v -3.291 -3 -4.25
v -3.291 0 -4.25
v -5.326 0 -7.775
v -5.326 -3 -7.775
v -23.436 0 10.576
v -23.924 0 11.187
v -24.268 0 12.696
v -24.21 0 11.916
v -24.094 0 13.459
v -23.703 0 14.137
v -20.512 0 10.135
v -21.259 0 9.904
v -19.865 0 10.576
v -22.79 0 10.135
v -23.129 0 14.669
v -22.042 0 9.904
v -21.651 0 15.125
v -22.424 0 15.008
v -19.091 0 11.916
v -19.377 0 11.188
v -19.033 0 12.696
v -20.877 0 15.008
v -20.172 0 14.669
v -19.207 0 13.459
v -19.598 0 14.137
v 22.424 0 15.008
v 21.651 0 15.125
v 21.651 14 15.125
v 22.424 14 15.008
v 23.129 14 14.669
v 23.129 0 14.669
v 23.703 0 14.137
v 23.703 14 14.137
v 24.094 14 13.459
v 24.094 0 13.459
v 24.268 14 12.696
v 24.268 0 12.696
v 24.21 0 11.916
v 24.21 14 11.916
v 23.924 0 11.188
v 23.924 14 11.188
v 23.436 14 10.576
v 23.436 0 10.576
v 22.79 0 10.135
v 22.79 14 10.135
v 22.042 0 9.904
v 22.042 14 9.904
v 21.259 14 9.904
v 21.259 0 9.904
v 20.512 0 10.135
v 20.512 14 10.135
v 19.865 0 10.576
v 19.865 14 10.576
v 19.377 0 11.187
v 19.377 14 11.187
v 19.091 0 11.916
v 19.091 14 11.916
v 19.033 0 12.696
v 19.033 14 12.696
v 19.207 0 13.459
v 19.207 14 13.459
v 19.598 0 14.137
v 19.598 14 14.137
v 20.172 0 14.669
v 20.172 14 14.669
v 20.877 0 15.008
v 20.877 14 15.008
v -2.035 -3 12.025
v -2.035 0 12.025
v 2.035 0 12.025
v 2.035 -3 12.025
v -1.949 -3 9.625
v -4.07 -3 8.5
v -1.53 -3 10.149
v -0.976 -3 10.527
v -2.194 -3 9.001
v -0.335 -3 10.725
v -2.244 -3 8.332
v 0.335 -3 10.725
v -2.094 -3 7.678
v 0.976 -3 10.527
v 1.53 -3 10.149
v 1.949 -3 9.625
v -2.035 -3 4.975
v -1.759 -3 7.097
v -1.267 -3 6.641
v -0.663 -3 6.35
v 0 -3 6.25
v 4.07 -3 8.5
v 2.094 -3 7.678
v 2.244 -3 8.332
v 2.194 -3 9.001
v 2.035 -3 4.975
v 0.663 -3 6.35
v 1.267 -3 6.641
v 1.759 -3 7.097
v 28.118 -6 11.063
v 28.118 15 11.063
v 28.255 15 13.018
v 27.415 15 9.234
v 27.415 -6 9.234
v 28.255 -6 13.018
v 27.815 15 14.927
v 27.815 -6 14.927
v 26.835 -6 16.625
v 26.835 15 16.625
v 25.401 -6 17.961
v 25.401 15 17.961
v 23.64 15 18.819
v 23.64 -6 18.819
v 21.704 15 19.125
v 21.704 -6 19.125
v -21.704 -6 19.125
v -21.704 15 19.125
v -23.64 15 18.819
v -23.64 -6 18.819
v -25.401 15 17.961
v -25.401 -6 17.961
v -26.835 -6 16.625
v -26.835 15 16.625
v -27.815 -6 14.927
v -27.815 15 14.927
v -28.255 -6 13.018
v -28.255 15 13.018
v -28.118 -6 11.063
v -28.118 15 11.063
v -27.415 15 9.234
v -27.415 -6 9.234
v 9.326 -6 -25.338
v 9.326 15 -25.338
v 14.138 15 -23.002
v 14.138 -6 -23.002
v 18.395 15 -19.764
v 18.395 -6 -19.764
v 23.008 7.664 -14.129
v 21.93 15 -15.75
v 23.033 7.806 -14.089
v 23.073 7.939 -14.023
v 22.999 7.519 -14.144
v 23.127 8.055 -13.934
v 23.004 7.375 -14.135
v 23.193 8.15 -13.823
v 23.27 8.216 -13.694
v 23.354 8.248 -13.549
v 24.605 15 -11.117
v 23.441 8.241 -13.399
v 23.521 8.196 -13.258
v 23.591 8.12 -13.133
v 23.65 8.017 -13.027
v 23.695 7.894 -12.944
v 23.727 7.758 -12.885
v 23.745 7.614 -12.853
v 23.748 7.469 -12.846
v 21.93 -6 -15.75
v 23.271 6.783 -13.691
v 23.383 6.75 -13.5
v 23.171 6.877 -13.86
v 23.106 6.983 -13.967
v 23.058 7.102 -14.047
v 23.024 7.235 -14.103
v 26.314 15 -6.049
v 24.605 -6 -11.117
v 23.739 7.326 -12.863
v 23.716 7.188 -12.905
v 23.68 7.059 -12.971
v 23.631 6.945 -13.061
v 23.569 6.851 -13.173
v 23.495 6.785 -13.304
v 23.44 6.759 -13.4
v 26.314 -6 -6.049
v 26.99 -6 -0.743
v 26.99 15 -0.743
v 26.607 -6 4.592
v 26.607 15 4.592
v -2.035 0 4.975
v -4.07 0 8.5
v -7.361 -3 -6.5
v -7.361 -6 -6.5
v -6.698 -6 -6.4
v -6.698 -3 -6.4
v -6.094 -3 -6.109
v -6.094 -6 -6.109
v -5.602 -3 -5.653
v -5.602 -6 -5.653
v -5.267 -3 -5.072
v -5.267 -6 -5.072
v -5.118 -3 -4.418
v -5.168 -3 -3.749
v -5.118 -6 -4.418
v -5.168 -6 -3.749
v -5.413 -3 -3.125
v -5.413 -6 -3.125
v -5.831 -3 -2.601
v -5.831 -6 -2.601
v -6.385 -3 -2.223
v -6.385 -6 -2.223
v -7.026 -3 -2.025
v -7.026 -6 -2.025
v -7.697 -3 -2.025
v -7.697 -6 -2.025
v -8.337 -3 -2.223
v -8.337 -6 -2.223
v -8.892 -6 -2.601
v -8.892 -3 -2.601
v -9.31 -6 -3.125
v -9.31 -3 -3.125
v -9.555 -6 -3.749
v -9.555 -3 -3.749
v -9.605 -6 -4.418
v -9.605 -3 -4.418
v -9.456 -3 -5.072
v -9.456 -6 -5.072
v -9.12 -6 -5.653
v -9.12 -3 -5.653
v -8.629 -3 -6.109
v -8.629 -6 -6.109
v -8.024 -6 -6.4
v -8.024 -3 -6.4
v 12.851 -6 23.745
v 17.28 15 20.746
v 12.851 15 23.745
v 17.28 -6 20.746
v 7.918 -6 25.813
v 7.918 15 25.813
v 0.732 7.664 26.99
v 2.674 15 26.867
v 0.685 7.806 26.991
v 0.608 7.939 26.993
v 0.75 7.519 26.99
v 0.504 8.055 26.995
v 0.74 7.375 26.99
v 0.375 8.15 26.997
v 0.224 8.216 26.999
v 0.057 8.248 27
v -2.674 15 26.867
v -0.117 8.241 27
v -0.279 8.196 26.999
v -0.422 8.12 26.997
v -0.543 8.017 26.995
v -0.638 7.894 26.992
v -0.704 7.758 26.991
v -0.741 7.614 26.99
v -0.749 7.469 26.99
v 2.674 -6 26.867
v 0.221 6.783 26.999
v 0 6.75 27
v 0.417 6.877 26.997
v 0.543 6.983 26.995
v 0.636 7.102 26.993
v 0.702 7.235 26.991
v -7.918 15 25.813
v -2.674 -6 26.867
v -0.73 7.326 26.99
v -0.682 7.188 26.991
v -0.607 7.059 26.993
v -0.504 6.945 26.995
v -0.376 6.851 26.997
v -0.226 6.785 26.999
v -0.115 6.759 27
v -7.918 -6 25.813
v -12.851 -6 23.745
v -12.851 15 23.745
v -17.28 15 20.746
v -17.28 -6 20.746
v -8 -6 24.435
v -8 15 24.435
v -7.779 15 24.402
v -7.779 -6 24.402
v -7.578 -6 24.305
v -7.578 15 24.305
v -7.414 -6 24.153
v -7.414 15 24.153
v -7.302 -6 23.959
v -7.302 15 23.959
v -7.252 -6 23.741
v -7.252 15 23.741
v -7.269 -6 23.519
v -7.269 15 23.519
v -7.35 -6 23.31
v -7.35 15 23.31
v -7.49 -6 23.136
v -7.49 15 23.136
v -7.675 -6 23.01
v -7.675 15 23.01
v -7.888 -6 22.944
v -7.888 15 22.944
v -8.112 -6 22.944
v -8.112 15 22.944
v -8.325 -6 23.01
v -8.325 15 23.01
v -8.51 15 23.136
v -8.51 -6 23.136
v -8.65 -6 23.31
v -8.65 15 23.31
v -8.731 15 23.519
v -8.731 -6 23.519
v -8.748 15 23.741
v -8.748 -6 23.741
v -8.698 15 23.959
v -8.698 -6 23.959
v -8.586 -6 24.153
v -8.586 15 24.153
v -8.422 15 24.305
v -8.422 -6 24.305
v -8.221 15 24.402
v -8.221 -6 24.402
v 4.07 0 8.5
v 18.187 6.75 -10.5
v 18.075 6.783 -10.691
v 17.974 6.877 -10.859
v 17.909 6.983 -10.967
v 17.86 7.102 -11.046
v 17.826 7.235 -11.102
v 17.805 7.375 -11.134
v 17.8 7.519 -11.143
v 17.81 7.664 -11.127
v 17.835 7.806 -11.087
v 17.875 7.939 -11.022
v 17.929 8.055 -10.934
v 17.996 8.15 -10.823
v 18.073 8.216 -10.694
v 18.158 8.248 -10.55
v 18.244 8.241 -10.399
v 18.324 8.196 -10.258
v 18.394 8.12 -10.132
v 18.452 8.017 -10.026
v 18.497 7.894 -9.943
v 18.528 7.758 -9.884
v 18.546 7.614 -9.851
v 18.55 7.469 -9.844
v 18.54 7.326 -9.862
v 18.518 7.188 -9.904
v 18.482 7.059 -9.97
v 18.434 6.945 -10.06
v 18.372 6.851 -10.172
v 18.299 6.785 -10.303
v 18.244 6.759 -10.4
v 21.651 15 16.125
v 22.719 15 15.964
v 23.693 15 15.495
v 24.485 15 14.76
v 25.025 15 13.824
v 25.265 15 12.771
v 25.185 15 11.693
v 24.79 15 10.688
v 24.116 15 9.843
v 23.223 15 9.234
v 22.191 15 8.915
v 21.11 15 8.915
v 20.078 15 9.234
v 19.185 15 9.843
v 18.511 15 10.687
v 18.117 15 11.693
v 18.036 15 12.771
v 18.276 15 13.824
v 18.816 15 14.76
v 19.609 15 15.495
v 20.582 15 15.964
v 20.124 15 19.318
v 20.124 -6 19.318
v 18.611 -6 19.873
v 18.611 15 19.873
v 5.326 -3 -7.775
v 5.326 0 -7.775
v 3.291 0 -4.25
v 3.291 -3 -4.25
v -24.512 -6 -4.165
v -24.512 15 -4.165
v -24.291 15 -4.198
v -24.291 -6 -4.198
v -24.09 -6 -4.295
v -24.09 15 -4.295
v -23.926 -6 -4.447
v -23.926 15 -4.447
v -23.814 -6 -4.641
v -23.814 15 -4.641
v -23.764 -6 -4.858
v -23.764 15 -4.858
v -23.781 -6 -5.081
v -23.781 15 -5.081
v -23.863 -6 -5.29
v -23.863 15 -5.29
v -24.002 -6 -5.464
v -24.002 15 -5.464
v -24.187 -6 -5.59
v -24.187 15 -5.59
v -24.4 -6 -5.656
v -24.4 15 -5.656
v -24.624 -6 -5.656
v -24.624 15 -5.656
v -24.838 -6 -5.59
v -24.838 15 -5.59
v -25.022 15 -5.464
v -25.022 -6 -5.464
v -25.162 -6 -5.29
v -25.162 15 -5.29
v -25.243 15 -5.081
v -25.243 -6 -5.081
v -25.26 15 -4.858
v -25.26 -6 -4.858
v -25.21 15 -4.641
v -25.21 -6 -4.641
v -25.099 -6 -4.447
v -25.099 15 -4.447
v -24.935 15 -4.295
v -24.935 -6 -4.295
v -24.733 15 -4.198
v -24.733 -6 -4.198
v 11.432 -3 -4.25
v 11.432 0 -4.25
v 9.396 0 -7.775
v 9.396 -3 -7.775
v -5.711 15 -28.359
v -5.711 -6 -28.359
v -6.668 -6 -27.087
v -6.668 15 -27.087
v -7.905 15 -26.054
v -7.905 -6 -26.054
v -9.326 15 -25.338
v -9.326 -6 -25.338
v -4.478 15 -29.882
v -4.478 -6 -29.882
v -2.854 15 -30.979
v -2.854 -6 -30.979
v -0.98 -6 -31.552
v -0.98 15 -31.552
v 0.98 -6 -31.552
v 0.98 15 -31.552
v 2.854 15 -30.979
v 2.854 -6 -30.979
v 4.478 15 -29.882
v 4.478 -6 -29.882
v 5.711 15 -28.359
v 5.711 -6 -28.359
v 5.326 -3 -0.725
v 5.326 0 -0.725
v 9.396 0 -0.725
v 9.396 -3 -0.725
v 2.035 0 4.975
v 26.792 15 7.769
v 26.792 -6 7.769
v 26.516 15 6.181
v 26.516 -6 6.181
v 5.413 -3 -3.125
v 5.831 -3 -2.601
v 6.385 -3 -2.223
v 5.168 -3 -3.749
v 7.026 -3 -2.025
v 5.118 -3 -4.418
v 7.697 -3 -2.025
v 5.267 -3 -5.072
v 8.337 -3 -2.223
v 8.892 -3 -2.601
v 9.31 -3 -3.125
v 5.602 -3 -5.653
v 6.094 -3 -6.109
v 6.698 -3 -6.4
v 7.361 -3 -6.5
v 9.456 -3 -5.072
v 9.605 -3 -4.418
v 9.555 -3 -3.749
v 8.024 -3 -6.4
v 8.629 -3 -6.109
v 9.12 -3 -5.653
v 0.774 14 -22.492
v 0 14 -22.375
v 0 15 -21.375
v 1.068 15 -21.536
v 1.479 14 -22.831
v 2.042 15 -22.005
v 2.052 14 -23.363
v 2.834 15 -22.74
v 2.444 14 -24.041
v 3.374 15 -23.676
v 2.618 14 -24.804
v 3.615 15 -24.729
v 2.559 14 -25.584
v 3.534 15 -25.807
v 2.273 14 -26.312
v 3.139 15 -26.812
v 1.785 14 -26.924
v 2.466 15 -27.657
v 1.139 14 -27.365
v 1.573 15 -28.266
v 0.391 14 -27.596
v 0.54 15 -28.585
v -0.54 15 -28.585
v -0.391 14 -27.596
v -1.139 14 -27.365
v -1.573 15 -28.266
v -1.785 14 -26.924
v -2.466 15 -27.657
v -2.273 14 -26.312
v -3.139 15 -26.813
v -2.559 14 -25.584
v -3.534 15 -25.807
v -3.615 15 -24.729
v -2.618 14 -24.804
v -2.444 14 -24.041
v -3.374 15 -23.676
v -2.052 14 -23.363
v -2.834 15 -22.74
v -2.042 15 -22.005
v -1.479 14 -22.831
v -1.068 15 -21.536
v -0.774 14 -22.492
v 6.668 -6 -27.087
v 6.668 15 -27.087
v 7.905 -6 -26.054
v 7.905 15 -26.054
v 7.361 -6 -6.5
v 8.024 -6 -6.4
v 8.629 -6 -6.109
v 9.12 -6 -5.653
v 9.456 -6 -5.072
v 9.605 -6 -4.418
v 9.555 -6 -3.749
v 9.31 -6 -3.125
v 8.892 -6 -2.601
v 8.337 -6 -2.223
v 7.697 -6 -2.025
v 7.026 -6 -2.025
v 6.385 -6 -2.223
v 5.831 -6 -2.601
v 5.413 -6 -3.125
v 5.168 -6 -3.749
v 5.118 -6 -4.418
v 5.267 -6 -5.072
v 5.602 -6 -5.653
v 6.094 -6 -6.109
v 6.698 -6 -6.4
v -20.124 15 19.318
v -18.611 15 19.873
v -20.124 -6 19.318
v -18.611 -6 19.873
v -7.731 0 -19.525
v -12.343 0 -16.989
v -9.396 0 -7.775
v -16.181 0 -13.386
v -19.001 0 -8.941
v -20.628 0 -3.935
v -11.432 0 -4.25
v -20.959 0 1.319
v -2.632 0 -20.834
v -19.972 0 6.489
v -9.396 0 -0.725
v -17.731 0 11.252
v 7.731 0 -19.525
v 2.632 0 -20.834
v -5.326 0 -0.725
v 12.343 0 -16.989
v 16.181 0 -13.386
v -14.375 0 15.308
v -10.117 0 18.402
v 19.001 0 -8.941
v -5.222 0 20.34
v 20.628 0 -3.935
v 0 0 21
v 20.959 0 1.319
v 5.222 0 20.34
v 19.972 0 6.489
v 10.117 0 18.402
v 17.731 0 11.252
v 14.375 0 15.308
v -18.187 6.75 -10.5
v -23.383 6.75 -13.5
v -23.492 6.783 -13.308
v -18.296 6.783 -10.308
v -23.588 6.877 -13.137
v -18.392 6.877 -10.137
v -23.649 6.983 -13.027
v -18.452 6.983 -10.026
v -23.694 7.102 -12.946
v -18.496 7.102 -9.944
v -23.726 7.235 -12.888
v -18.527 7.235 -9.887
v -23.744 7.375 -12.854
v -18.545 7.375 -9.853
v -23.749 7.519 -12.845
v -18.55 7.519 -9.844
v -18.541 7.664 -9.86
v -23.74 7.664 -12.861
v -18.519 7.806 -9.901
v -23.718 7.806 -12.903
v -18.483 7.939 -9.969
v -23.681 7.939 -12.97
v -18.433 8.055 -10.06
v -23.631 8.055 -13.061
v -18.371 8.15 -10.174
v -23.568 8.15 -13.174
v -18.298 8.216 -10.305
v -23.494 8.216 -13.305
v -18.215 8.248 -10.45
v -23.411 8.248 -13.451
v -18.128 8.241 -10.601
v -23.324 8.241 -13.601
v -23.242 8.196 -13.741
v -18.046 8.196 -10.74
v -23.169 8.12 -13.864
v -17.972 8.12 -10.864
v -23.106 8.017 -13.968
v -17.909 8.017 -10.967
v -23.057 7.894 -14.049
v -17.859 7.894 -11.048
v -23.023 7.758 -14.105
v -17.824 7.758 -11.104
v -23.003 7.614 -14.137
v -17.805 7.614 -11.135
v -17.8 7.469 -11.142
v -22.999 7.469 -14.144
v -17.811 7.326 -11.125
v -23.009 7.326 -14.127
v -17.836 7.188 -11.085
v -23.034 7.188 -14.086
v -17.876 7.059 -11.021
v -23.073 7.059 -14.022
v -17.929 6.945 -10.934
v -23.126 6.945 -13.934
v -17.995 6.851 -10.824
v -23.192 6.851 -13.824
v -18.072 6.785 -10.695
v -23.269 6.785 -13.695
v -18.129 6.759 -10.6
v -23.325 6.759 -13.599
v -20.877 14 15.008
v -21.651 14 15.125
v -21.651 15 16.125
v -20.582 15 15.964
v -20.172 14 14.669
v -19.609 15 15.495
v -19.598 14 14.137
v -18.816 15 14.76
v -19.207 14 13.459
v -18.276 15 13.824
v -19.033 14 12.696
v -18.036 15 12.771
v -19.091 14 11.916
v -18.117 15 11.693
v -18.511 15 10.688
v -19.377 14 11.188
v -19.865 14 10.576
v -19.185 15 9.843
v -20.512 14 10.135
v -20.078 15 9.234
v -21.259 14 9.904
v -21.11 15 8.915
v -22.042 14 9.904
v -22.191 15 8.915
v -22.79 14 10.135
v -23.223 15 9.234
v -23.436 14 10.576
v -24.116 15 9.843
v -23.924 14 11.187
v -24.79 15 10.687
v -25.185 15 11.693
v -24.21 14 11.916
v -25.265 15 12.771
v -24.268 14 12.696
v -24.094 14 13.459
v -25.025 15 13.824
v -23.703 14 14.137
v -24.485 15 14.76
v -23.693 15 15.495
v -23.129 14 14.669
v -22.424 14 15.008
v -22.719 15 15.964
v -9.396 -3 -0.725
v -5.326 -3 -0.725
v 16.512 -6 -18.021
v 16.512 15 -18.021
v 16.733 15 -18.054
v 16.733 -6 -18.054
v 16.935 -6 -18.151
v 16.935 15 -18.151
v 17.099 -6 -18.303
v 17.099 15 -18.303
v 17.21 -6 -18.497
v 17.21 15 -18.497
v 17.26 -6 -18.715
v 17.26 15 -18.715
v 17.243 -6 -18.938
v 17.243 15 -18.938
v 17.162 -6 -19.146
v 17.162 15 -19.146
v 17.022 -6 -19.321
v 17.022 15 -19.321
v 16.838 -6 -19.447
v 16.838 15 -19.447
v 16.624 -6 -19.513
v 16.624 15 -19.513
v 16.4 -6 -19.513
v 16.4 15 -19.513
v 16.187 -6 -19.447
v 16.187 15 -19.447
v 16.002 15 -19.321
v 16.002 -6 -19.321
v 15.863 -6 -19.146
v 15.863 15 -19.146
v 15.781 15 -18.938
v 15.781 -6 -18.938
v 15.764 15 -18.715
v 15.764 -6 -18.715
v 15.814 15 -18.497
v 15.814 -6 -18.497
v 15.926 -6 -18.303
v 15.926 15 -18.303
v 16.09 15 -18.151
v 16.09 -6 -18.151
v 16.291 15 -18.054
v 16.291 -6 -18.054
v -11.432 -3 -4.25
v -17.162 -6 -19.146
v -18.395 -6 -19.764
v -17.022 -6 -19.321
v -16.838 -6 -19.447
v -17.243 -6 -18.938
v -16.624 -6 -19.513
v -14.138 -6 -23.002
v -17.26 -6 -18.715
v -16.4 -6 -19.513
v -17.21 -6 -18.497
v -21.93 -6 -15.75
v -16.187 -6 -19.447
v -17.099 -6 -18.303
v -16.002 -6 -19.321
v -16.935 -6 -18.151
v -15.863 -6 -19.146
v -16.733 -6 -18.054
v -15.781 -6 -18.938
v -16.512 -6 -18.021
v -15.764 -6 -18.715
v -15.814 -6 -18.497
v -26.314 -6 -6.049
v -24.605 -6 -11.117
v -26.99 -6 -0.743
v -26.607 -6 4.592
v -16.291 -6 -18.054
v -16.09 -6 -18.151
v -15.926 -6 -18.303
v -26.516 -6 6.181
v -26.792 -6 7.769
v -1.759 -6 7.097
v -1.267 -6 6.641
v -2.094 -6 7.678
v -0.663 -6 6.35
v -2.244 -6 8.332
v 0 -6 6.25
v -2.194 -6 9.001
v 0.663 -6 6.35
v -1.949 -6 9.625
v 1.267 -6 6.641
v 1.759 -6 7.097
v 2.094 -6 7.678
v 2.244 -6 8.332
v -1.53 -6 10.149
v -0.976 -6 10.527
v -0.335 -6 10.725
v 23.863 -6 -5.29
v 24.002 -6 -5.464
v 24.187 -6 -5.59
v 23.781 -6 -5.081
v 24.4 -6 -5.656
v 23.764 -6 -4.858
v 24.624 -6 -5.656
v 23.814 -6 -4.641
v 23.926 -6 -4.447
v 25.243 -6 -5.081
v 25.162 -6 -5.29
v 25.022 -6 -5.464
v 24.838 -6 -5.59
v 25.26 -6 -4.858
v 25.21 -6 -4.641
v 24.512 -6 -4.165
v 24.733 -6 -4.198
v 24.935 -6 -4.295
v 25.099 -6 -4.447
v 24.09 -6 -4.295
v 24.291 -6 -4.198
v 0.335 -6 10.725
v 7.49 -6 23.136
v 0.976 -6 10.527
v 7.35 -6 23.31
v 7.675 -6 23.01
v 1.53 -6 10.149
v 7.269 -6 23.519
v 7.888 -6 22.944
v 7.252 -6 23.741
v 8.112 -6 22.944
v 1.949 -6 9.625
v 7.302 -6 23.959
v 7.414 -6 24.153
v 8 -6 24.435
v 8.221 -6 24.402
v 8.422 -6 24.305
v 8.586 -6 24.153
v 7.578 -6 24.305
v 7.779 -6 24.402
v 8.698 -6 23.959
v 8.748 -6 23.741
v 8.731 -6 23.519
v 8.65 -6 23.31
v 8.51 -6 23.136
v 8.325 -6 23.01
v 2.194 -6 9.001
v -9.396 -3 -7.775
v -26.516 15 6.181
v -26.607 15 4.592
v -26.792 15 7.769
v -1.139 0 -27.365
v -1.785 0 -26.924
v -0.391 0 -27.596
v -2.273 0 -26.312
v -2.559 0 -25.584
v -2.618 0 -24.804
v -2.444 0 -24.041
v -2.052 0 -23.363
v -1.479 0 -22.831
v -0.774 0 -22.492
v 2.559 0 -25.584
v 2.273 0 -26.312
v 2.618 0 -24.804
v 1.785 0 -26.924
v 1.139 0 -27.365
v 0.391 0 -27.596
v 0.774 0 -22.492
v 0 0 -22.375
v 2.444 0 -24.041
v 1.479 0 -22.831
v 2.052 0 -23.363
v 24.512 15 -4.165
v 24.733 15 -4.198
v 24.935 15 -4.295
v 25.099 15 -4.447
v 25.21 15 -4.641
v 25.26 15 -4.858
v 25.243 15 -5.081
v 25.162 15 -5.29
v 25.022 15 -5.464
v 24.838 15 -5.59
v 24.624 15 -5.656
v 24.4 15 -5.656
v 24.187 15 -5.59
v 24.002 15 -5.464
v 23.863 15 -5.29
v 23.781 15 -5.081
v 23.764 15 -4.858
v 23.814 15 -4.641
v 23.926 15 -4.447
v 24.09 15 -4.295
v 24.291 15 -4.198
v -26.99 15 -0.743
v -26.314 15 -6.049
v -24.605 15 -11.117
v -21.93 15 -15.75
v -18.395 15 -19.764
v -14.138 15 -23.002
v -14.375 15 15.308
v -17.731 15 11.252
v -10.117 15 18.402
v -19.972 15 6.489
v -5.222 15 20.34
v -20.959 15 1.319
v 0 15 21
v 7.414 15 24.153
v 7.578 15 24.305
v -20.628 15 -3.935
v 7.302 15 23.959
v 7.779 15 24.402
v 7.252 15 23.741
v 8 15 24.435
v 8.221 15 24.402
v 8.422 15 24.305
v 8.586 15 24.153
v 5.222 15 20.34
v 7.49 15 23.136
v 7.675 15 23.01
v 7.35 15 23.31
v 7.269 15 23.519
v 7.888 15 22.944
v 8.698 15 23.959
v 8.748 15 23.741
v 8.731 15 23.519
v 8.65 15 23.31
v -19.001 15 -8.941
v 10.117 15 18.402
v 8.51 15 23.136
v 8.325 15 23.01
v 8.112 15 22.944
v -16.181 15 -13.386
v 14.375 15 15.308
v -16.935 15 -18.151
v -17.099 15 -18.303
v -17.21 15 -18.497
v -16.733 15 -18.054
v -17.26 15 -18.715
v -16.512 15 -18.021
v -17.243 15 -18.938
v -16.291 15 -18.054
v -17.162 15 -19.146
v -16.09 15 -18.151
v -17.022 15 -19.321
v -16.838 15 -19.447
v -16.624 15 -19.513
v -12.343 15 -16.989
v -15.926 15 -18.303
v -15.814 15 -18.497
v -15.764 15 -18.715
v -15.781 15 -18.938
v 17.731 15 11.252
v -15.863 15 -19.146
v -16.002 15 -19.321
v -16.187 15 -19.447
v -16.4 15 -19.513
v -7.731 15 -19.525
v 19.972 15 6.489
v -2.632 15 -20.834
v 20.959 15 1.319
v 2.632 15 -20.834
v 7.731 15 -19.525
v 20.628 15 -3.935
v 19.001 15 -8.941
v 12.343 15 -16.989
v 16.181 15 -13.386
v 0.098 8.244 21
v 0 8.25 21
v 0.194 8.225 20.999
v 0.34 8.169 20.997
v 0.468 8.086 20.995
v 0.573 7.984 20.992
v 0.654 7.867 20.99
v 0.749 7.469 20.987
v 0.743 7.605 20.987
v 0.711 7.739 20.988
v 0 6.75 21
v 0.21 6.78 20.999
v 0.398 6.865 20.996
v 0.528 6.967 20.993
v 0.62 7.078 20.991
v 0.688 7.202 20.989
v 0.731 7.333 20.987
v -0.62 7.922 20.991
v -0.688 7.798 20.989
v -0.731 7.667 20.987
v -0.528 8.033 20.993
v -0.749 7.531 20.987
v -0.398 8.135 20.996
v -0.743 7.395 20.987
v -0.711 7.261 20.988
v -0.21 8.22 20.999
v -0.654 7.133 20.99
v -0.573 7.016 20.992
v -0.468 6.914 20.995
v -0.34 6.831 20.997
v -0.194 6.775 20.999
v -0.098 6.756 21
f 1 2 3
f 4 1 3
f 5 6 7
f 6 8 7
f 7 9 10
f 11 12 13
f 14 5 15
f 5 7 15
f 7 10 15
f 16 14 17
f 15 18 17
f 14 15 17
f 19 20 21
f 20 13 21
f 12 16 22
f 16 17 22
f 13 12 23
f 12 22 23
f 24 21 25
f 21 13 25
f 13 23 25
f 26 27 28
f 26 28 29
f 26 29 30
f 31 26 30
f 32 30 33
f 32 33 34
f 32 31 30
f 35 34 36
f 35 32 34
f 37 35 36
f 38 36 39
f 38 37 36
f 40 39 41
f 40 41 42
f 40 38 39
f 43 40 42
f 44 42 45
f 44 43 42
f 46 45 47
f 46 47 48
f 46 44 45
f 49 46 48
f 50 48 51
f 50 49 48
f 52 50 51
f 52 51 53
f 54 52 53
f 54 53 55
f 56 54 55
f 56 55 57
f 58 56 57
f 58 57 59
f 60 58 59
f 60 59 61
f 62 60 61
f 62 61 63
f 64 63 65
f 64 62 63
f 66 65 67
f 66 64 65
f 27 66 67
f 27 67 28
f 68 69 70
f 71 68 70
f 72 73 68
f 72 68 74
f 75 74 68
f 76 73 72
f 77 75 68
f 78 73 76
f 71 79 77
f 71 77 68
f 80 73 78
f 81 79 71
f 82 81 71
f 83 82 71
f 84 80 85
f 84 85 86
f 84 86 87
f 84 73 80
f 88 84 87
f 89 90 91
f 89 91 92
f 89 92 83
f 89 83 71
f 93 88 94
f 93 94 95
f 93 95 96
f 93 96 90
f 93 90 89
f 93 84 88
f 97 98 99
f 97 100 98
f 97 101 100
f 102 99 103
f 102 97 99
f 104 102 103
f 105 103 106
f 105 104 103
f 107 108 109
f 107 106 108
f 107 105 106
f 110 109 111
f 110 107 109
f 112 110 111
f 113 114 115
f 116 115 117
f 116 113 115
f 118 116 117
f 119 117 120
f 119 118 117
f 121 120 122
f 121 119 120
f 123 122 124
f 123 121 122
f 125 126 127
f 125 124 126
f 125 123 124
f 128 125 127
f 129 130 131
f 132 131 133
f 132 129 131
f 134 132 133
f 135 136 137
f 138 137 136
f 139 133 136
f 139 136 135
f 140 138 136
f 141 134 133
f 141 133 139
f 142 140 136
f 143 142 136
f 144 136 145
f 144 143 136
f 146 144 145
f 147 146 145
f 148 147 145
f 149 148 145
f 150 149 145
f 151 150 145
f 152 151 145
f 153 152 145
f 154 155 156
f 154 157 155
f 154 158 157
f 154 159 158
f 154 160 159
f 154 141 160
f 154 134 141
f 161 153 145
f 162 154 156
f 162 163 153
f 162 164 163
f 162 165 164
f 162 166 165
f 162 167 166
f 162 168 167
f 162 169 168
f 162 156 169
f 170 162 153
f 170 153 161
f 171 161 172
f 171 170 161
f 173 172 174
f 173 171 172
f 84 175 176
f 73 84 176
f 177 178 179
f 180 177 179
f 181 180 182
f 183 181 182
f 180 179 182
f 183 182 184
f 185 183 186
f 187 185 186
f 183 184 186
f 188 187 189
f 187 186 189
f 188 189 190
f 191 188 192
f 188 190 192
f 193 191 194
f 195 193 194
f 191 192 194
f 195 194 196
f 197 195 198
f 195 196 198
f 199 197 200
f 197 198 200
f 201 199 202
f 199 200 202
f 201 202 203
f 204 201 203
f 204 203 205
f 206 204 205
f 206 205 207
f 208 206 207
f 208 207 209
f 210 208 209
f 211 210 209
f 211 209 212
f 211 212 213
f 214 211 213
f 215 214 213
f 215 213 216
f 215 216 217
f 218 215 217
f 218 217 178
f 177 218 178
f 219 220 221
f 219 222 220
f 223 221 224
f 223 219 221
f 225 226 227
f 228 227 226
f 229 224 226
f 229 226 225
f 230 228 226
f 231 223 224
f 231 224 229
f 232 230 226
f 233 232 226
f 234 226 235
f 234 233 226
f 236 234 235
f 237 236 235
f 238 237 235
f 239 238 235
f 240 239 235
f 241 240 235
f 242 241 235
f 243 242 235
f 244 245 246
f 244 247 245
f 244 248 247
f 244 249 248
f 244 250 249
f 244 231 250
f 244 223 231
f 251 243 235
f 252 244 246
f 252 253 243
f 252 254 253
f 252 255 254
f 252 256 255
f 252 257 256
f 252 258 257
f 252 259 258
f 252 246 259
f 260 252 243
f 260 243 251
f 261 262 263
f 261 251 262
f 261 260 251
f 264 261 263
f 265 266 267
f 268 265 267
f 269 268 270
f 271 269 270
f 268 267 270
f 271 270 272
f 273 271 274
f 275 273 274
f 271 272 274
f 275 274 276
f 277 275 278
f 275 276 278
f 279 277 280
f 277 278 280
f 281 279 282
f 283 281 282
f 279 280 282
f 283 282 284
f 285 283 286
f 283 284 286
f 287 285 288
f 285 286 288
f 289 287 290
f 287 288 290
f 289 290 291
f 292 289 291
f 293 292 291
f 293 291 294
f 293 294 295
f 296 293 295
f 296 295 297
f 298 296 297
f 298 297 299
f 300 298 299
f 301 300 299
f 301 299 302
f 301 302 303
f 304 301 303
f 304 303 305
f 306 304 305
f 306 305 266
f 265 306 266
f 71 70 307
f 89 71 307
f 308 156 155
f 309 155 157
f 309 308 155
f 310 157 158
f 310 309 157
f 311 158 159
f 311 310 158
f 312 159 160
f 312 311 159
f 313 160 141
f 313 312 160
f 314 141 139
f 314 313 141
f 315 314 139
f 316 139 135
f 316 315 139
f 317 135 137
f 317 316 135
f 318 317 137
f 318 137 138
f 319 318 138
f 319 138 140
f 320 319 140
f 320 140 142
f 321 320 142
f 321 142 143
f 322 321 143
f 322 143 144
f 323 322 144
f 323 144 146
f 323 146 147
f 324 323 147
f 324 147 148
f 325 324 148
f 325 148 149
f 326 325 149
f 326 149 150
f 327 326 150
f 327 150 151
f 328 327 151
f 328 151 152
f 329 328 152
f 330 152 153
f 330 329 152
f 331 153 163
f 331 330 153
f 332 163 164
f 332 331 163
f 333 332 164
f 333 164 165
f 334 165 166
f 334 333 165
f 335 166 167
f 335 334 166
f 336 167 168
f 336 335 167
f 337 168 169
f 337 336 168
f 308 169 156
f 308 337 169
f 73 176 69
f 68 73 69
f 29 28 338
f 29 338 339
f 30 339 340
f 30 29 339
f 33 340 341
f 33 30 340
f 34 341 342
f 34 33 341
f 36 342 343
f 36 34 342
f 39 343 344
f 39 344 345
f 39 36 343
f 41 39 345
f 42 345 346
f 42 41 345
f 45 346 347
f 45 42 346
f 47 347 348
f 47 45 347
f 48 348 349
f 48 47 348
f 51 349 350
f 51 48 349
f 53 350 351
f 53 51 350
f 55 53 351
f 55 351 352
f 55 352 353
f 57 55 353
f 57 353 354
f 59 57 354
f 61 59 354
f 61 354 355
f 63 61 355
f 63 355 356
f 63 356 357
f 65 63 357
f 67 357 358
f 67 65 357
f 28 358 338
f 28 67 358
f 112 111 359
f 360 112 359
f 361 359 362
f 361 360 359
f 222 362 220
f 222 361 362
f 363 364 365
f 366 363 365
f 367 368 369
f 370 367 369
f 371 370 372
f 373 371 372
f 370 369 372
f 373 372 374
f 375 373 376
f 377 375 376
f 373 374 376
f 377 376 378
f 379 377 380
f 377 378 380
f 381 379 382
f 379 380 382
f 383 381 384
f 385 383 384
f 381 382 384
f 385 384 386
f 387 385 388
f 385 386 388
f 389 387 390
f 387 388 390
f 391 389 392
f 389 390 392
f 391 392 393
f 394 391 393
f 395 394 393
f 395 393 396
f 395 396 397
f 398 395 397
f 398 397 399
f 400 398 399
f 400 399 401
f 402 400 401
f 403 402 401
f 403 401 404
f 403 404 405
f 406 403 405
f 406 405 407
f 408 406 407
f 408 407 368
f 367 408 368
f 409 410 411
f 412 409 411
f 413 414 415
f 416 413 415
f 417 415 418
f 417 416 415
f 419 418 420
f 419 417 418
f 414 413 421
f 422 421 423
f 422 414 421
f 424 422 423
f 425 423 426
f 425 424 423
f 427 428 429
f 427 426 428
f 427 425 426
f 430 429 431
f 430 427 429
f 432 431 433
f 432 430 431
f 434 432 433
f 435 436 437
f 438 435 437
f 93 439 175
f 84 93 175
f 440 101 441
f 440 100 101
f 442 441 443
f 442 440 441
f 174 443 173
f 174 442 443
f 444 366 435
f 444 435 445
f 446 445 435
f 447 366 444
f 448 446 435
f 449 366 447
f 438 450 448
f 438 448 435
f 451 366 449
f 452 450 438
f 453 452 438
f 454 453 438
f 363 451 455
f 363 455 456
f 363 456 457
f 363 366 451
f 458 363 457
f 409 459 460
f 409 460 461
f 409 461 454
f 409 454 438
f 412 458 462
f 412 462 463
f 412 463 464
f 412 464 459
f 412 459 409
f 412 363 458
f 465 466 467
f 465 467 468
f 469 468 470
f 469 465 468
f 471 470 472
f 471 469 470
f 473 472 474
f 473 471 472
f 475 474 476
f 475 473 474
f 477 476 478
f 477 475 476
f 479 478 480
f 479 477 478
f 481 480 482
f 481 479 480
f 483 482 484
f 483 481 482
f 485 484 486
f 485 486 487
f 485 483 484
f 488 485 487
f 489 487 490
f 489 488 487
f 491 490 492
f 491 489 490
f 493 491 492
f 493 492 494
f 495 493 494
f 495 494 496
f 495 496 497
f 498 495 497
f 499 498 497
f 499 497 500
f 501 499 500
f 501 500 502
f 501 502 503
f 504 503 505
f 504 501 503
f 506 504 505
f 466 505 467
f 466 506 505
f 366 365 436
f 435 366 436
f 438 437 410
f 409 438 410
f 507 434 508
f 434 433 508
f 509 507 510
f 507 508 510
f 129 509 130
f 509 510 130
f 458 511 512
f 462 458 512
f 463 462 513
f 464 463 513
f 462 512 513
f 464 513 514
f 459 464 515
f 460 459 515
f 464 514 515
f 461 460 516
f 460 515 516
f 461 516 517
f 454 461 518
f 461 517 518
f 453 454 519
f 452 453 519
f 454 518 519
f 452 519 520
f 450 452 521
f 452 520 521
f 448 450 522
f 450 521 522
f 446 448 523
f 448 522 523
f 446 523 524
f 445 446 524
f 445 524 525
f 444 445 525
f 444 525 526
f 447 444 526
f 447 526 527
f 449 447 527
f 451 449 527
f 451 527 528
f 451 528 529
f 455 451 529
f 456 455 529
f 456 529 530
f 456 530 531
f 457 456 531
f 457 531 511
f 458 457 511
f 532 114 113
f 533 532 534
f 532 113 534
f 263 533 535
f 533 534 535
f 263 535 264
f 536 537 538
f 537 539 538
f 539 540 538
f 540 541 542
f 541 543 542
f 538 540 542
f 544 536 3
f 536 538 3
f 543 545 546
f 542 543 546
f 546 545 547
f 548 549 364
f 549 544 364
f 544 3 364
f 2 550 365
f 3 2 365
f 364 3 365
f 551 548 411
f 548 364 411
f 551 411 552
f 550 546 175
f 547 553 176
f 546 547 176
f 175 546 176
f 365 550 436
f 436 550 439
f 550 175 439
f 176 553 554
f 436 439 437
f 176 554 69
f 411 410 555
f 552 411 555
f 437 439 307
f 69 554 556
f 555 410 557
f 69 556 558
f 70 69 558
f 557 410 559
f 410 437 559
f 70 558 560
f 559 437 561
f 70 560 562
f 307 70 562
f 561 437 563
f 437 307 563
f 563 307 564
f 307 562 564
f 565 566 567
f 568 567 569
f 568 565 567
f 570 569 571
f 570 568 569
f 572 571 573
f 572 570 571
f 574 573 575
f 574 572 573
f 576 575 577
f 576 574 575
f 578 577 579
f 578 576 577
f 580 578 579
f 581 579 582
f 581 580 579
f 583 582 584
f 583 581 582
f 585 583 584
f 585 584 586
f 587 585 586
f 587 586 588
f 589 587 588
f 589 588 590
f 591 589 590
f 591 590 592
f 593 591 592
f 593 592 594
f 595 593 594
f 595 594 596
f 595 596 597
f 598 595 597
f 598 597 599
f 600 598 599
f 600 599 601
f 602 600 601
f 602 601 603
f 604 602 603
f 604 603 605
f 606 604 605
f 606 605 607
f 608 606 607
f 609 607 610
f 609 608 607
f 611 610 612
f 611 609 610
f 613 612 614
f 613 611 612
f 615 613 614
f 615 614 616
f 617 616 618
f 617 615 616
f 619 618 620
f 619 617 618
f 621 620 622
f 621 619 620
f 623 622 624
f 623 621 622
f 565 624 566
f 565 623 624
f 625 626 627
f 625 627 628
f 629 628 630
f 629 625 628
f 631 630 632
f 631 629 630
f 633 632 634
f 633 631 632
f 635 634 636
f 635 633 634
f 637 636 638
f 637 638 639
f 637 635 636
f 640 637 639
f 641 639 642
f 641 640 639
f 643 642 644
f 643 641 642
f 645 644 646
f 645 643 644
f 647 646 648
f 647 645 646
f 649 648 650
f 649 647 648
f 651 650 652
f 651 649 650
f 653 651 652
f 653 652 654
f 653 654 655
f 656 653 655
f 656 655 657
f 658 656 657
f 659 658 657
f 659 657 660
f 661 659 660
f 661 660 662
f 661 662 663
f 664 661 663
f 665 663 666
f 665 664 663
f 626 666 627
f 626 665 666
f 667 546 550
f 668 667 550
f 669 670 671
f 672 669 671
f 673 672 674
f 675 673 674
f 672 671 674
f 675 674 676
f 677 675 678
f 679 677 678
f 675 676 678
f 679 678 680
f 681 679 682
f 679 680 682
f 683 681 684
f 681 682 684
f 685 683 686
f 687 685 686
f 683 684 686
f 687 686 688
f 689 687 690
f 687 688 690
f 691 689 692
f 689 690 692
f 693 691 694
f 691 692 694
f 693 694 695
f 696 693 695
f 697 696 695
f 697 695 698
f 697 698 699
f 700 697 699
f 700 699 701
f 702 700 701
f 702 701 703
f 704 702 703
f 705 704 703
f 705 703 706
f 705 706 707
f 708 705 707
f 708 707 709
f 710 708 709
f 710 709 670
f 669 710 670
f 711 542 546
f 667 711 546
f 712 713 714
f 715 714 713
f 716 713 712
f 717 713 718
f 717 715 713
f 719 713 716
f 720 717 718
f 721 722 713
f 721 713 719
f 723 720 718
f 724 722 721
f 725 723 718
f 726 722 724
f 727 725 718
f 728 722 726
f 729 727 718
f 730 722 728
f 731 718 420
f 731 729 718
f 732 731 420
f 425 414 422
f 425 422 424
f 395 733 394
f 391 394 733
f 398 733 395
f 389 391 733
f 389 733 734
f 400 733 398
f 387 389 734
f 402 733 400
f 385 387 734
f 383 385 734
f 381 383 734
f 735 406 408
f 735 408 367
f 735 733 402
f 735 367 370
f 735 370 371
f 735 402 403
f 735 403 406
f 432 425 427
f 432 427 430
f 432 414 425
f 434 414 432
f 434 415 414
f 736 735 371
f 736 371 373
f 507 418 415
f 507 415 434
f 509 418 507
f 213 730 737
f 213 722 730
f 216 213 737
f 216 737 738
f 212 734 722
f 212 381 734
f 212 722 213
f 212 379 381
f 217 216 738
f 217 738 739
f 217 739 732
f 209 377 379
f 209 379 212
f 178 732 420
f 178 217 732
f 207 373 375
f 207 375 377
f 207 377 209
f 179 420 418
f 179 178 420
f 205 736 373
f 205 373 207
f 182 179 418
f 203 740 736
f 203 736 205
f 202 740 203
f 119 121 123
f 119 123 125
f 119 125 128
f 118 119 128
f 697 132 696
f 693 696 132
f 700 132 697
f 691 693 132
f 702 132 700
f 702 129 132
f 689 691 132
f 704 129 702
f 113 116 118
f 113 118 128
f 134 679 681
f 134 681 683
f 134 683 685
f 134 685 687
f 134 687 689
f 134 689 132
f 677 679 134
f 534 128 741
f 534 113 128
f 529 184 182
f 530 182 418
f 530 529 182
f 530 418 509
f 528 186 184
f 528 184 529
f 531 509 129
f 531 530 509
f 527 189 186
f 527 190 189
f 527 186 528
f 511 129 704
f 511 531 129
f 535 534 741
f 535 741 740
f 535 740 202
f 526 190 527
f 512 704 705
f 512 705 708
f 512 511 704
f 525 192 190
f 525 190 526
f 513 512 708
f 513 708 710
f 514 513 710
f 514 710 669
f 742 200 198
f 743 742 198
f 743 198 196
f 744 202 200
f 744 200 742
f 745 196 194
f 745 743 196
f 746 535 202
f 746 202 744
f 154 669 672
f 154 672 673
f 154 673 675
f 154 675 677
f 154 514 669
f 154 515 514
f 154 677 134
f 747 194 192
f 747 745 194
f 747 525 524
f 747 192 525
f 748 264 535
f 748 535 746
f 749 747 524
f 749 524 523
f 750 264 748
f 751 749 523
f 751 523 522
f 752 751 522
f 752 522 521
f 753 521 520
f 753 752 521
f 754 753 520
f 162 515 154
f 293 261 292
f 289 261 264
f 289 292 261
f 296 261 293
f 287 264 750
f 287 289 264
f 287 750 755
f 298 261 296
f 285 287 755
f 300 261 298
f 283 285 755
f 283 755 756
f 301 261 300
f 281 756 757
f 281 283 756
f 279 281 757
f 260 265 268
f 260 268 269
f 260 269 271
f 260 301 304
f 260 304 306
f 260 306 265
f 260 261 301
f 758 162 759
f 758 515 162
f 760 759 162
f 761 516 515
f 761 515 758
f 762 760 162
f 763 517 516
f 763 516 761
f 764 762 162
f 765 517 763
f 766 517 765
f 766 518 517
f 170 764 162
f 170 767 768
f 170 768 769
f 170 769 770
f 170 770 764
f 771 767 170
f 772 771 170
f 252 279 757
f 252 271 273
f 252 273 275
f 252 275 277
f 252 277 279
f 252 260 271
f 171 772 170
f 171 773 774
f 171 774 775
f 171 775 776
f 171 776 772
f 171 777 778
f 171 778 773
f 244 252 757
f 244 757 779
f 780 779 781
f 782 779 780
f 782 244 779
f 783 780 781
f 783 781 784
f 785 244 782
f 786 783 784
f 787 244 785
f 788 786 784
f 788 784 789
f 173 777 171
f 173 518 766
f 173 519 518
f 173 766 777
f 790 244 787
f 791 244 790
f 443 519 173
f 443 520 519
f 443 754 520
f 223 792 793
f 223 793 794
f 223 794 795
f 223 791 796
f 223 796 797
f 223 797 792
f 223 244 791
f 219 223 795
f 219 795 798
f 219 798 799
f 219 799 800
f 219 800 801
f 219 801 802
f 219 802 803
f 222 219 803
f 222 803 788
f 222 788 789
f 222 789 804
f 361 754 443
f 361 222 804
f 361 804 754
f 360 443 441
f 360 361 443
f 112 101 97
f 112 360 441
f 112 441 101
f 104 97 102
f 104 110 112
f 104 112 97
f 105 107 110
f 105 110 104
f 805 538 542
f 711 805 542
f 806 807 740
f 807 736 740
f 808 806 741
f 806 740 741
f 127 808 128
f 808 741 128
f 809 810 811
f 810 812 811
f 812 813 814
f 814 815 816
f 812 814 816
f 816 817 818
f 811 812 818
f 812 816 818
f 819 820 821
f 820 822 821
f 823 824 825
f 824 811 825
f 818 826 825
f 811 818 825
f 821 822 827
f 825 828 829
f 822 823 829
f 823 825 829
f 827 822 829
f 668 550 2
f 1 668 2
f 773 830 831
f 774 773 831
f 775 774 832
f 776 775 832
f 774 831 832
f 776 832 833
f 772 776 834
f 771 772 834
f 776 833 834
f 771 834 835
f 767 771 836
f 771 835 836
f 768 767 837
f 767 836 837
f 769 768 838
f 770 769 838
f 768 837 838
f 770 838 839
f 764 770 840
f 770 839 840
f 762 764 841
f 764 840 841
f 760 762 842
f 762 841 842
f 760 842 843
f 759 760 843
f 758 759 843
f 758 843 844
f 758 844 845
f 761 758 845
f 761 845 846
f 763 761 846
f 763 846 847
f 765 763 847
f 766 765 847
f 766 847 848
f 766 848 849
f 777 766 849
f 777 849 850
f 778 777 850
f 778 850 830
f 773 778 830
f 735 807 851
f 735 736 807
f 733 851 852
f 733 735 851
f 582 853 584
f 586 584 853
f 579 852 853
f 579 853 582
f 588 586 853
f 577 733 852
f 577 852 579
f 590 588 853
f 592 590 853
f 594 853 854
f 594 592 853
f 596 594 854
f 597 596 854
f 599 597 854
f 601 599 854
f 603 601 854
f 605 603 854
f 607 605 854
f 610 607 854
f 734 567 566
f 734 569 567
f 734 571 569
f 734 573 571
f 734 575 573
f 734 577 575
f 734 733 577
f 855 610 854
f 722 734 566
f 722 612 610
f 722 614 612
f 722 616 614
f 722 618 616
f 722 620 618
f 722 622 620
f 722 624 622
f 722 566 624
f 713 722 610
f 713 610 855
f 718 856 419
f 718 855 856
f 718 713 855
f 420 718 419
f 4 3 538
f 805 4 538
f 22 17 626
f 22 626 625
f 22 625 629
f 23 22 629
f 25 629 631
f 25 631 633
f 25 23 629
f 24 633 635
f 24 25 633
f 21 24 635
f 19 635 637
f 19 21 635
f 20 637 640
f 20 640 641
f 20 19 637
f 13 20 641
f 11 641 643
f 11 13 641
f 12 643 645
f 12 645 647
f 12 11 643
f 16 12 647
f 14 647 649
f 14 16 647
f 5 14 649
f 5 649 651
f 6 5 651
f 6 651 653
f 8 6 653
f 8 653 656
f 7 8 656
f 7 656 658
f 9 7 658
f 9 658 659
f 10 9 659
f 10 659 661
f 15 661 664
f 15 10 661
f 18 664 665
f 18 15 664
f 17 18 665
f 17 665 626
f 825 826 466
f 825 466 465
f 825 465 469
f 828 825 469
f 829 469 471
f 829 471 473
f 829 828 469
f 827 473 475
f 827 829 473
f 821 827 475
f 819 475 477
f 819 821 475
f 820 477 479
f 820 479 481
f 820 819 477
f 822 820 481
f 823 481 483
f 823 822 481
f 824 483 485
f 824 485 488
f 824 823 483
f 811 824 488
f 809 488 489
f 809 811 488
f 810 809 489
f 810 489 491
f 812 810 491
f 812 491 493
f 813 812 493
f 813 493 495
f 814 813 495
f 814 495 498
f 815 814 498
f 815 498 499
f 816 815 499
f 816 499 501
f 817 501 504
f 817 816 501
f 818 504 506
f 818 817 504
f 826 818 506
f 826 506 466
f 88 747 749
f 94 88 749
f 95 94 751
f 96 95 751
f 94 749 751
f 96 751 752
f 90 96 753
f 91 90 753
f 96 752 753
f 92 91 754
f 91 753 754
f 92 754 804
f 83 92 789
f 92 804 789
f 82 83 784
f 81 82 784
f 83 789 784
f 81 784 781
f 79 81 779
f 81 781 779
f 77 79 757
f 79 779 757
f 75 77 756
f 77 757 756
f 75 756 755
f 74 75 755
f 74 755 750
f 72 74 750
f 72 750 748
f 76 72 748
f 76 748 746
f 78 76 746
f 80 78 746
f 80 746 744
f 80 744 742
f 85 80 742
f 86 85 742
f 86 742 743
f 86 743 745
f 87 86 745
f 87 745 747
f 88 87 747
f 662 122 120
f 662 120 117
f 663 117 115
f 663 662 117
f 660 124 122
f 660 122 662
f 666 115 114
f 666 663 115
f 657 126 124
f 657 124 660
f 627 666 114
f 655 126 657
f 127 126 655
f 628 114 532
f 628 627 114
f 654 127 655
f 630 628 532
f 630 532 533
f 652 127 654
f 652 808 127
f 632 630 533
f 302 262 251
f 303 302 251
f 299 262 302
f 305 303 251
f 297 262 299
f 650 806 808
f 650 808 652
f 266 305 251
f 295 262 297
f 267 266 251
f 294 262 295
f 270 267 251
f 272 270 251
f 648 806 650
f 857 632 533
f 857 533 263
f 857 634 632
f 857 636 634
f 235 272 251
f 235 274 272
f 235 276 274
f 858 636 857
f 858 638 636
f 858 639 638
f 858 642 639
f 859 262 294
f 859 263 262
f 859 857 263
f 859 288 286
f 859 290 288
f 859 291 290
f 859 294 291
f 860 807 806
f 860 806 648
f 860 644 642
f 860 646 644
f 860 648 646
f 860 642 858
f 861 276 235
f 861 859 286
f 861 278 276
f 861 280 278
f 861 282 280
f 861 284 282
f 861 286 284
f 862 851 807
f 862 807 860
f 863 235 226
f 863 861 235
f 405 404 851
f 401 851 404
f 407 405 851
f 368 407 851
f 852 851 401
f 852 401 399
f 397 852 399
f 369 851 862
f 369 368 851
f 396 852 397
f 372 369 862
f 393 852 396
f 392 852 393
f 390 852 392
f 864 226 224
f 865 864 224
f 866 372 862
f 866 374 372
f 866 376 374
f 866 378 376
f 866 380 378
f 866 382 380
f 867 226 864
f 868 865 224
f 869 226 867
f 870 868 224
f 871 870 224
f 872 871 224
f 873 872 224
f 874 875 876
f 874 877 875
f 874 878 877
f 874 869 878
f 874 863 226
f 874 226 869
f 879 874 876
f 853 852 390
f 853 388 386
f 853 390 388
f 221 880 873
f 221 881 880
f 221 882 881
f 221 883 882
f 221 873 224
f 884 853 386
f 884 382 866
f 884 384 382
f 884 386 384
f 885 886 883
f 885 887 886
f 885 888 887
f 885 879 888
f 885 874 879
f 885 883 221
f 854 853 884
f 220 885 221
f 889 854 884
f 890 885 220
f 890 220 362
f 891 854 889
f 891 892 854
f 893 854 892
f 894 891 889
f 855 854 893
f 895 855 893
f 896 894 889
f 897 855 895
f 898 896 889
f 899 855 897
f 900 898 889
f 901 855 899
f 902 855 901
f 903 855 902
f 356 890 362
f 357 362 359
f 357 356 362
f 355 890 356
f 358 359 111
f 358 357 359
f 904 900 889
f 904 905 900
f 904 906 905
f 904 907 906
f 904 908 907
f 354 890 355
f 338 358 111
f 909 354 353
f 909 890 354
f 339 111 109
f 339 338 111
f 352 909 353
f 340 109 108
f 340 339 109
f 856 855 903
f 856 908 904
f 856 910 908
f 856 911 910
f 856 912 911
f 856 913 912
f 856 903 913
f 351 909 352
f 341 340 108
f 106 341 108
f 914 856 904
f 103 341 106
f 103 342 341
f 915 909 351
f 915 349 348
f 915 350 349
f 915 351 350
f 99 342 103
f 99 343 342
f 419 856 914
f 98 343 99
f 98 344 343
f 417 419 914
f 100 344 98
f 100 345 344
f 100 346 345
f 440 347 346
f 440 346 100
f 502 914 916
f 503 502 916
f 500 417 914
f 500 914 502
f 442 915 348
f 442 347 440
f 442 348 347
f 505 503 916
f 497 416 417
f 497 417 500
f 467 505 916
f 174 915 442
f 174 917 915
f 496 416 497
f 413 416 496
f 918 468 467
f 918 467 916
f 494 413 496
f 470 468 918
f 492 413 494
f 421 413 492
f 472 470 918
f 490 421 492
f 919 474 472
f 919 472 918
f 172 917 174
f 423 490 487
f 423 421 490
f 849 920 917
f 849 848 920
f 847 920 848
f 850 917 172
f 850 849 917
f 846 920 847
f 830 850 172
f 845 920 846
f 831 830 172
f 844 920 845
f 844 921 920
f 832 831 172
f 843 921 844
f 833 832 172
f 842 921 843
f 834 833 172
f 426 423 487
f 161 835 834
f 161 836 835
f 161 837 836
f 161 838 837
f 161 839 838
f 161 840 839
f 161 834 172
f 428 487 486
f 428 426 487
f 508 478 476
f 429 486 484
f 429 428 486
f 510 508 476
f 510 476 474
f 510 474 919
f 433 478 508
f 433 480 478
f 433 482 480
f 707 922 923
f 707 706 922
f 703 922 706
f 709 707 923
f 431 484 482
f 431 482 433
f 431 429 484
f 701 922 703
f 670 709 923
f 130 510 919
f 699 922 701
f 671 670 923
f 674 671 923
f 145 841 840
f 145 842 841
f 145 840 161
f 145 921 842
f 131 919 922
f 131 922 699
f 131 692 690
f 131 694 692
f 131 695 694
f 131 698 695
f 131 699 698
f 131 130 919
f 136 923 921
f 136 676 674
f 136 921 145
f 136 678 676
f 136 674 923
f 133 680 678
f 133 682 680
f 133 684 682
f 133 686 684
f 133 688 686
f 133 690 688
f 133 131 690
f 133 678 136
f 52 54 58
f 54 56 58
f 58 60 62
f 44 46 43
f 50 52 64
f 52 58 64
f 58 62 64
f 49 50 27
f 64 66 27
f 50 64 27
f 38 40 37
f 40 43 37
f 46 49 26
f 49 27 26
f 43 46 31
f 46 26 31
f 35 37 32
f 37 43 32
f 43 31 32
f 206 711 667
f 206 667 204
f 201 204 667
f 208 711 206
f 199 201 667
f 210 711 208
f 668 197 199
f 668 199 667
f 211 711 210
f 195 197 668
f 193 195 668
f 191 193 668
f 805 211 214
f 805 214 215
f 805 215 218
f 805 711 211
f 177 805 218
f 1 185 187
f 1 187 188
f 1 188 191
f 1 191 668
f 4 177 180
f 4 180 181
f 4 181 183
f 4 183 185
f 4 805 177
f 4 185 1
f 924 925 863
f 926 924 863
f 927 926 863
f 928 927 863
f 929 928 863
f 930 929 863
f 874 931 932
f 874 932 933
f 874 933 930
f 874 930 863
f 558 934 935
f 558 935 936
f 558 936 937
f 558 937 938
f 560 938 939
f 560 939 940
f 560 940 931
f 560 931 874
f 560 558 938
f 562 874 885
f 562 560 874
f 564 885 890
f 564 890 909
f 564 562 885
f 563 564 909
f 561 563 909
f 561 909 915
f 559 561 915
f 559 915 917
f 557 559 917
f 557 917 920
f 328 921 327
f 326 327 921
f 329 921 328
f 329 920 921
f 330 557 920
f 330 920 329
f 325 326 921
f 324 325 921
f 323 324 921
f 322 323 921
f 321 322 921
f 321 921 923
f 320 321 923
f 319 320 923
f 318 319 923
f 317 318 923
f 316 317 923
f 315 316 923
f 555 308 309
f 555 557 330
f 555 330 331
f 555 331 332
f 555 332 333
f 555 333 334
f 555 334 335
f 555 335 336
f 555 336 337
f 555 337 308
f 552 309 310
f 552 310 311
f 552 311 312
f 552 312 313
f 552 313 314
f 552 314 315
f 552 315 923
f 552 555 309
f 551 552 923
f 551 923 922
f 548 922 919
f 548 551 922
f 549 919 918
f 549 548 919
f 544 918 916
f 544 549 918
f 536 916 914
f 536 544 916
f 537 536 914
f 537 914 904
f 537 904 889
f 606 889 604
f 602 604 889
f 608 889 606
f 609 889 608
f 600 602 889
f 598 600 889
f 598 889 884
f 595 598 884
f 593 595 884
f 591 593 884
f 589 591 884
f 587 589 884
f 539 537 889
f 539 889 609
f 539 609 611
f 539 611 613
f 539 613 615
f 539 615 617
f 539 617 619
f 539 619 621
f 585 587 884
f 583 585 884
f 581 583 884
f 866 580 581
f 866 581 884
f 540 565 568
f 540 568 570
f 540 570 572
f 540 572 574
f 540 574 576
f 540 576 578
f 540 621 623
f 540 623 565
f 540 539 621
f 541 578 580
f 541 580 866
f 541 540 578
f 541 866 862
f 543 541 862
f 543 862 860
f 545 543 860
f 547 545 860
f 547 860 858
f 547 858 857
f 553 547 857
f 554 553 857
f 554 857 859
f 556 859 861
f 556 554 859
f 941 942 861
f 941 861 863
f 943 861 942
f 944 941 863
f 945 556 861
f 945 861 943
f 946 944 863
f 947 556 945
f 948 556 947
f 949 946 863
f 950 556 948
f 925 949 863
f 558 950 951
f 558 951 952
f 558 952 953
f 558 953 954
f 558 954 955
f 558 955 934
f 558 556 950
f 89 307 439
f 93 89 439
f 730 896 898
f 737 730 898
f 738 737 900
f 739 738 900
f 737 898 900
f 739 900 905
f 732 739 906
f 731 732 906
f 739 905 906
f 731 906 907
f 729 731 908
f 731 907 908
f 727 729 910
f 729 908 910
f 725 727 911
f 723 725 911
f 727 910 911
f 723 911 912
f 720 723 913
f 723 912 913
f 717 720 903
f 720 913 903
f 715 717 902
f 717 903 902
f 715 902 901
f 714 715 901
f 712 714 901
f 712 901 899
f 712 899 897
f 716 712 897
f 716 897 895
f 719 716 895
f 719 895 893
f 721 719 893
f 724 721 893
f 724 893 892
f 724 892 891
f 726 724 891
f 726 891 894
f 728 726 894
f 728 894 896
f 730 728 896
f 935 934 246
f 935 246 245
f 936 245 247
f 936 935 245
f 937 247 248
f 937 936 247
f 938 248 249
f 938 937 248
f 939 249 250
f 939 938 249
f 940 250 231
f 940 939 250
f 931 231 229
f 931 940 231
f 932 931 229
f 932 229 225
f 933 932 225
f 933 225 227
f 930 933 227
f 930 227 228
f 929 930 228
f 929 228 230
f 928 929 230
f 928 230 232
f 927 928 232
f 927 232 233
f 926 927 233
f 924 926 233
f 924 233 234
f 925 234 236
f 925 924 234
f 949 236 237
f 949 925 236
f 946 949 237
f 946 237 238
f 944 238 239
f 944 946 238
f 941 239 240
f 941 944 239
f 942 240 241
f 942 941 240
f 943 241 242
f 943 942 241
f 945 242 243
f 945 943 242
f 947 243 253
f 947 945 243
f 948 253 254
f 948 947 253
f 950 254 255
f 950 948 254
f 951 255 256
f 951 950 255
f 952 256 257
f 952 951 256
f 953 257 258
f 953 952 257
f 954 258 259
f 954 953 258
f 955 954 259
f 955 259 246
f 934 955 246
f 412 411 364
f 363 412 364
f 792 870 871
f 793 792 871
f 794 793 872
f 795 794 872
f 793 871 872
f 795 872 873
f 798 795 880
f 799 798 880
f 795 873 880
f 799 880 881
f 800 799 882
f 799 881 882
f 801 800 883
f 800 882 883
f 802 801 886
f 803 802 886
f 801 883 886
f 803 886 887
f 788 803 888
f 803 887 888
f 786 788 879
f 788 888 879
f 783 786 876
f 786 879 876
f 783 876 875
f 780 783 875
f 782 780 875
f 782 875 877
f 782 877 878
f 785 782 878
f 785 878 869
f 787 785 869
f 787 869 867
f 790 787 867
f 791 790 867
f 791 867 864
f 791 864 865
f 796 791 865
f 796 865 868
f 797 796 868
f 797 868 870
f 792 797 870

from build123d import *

# Parameters (mm, degrees)
SKETCH_1_R               = 2.625
SKETCH_1_R_2             = 21
EXTRUDE_1_DEPTH          = 15
EXTRUDE_START            = 6
EXTRUDE_2_DEPTH          = 6
FILLET_1_R               = 7
CHAMFER_1_SIZE           = 1
SKETCH_4_R               = 2.25
CUT_EXTRUDE_1_DEPTH      = 48.335527685
CUT_EXTRUDE_2_DEPTH      = 3
SKETCH_6_R               = 0.75
CUT_EXTRUDE_3_DEPTH      = 48.335527685
SKETCH_7_R               = 0.75
CUT_EXTRUDE_4_DEPTH      = 45.996135167
PATTERN_CIRCULAR_1_COUNT = 3


with BuildPart() as part:
    # Эскиз1 → Бобышка-Вытянуть1 (new body)
    with BuildSketch(Plane(origin=(0, 0, 0), x_dir=(1, 0, 0), z_dir=(0, 1, 0))):
        with BuildLine():
            ThreePointArc((25.949265582, -7.458928593), (23.382685902, 13.5), (6.515011145, 26.2021875))
            ThreePointArc((6.515011145, 26.2021875), (0, 31.625), (-6.515011145, 26.2021875))
            ThreePointArc((-6.515011145, 26.2021875), (-23.382685902, 13.5), (-25.949265582, -7.458928593))
            ThreePointArc((-25.949265582, -7.458928593), (-27.388053395, -15.8125), (-19.434254437, -18.743258907))
            ThreePointArc((-19.434254437, -18.743258907), (0, -27), (19.434254437, -18.743258907))
            ThreePointArc((19.434254437, -18.743258907), (27.388053395, -15.8125), (25.949265582, -7.458928593))
        make_face()
        with Locations(Location((0, 25, 0), (0, 0, 270))):
            Circle(SKETCH_1_R, mode=Mode.SUBTRACT)
        with Locations(Location((0, 0, 0), (0, 0, 270))):
            Circle(SKETCH_1_R_2, mode=Mode.SUBTRACT)
        with Locations(Location((-21.650635095, -12.5, 0), (0, 0, 270))):
            Circle(SKETCH_1_R, mode=Mode.SUBTRACT)
        with Locations(Location((21.650635095, -12.5, 0), (0, 0, 270))):
            Circle(SKETCH_1_R, mode=Mode.SUBTRACT)
    extrude(amount=EXTRUDE_1_DEPTH)

    # Эскиз2 → Бобышка-Вытянуть2 (add)
    with BuildSketch(Plane.XZ.offset(EXTRUDE_START)):
        with BuildLine():
            ThreePointArc((25.949265582, 7.458928593), (27.388053395, 15.8125), (19.434254437, 18.743258907))
            ThreePointArc((19.434254437, 18.743258907), (0, 27), (-19.434254437, 18.743258907))
            ThreePointArc((-19.434254437, 18.743258907), (-27.388053395, 15.8125), (-25.949265582, 7.458928593))
            ThreePointArc((-25.949265582, 7.458928593), (-23.382685902, -13.5), (-6.515011145, -26.2021875))
            ThreePointArc((-6.515011145, -26.2021875), (0, -31.625), (6.515011145, -26.2021875))
            ThreePointArc((6.515011145, -26.2021875), (23.382685902, -13.5), (25.949265582, 7.458928593))
        make_face()
    extrude(amount=-EXTRUDE_2_DEPTH)

    # Скругление1
    fillet_1_edges = [part.edges().sort_by_distance(p)[0] for p in [
        (19.434254437, 4.5, 18.743258907),
        (-19.434254437, 4.5, 18.743258907),
        (-25.949265582, 4.5, 7.458928593),
        (-6.515011145, 4.5, -26.2021875),
        (6.515011145, 4.5, -26.2021875),
        (25.949265582, 4.5, 7.458928593),
    ]]
    fillet(fillet_1_edges, radius=FILLET_1_R)

    # Фаска1
    chamfer_1_edges = [part.edges().sort_by_distance(p)[0] for p in [
        (21.650635095, 15, 9.875),
        (0, 15, -27.625),
        (-21.650635095, 15, 9.875),
    ]]
    chamfer(chamfer_1_edges, length=CHAMFER_1_SIZE)

    # Эскиз4 → Вырез-Вытянуть1 (cut, through all)
    with BuildSketch(Plane.XZ.offset(6)):
        with Locations(Location((0, 8.5, 0), (0, 0, 270))):
            Circle(SKETCH_4_R)
        with Locations(Location((7.361215932, -4.25, 0), (0, 0, 270))):
            Circle(SKETCH_4_R)
        with Locations(Location((-7.361215932, -4.25, 0), (0, 0, 270))):
            Circle(SKETCH_4_R)
    extrude(amount=-CUT_EXTRUDE_1_DEPTH, mode=Mode.SUBTRACT)

    # Эскиз5 → Вырез-Вытянуть2 (cut)
    with BuildSketch(Plane(origin=(0, 0, 0), x_dir=(1, 0, 0), z_dir=(0, 1, 0))):
        Polygon((2.035159699, -12.025), (4.070319398, -8.5), (2.035159699, -4.975), (-2.035159699, -4.975), (-4.070319398, -8.5), (-2.035159699, -12.025), align=None)
        Polygon((5.326056233, 0.725), (9.396375631, 0.725), (11.43153533, 4.25), (9.396375631, 7.775), (5.326056233, 7.775), (3.290896534, 4.25), align=None)
        Polygon((-11.43153533, 4.25), (-9.396375631, 0.725), (-5.326056233, 0.725), (-3.290896534, 4.25), (-5.326056233, 7.775), (-9.396375631, 7.775), align=None)
    extrude(amount=-CUT_EXTRUDE_2_DEPTH, mode=Mode.SUBTRACT)

    # Эскиз6 → Вырез-Вытянуть3 (cut, through all)
    with BuildSketch(Plane(origin=(0, 15, 0), x_dir=(1, 0, 0), z_dir=(0, 1, 0))):
        with Locations(Location((-8, -23.685438565, 0), (0, 0, 270))):
            Circle(SKETCH_6_R)
        with Locations(Location((8, -23.685438565, 0), (0, 0, 270))):
            Circle(SKETCH_6_R)
        with Locations(Location((-16.512191497, 18.770922513, 0), (0, 0, 270))):
            Circle(SKETCH_6_R)
        with Locations(Location((-24.512191497, 4.914516052, 0), (0, 0, 270))):
            Circle(SKETCH_6_R)
        with Locations(Location((24.512191497, 4.914516052, 0), (0, 0, 270))):
            Circle(SKETCH_6_R)
        with Locations(Location((16.512191497, 18.770922513, 0), (0, 0, 270))):
            Circle(SKETCH_6_R)
    extrude(amount=-CUT_EXTRUDE_3_DEPTH, mode=Mode.SUBTRACT)

    # Эскиз7 → Вырез-Вытянуть4 (cut, through all)
    with BuildSketch(Plane.XY):
        with Locations(Location((0, 7.5, 0), (0, 0, 270.000000034))):
            Circle(SKETCH_7_R)
    cut_extrude_4 = extrude(amount=CUT_EXTRUDE_4_DEPTH, mode=Mode.SUBTRACT)

    # Круговой массив1: Вырез-Вытянуть4 ×3 about axis
    pattern_circular_1_axis = Axis((0, 15, 0), (0, -1, 0))
    for i in range(1, PATTERN_CIRCULAR_1_COUNT):
        add(cut_extrude_4.rotate(pattern_circular_1_axis, i * 360 / PATTERN_CIRCULAR_1_COUNT), mode=Mode.SUBTRACT)


solid = part.part
